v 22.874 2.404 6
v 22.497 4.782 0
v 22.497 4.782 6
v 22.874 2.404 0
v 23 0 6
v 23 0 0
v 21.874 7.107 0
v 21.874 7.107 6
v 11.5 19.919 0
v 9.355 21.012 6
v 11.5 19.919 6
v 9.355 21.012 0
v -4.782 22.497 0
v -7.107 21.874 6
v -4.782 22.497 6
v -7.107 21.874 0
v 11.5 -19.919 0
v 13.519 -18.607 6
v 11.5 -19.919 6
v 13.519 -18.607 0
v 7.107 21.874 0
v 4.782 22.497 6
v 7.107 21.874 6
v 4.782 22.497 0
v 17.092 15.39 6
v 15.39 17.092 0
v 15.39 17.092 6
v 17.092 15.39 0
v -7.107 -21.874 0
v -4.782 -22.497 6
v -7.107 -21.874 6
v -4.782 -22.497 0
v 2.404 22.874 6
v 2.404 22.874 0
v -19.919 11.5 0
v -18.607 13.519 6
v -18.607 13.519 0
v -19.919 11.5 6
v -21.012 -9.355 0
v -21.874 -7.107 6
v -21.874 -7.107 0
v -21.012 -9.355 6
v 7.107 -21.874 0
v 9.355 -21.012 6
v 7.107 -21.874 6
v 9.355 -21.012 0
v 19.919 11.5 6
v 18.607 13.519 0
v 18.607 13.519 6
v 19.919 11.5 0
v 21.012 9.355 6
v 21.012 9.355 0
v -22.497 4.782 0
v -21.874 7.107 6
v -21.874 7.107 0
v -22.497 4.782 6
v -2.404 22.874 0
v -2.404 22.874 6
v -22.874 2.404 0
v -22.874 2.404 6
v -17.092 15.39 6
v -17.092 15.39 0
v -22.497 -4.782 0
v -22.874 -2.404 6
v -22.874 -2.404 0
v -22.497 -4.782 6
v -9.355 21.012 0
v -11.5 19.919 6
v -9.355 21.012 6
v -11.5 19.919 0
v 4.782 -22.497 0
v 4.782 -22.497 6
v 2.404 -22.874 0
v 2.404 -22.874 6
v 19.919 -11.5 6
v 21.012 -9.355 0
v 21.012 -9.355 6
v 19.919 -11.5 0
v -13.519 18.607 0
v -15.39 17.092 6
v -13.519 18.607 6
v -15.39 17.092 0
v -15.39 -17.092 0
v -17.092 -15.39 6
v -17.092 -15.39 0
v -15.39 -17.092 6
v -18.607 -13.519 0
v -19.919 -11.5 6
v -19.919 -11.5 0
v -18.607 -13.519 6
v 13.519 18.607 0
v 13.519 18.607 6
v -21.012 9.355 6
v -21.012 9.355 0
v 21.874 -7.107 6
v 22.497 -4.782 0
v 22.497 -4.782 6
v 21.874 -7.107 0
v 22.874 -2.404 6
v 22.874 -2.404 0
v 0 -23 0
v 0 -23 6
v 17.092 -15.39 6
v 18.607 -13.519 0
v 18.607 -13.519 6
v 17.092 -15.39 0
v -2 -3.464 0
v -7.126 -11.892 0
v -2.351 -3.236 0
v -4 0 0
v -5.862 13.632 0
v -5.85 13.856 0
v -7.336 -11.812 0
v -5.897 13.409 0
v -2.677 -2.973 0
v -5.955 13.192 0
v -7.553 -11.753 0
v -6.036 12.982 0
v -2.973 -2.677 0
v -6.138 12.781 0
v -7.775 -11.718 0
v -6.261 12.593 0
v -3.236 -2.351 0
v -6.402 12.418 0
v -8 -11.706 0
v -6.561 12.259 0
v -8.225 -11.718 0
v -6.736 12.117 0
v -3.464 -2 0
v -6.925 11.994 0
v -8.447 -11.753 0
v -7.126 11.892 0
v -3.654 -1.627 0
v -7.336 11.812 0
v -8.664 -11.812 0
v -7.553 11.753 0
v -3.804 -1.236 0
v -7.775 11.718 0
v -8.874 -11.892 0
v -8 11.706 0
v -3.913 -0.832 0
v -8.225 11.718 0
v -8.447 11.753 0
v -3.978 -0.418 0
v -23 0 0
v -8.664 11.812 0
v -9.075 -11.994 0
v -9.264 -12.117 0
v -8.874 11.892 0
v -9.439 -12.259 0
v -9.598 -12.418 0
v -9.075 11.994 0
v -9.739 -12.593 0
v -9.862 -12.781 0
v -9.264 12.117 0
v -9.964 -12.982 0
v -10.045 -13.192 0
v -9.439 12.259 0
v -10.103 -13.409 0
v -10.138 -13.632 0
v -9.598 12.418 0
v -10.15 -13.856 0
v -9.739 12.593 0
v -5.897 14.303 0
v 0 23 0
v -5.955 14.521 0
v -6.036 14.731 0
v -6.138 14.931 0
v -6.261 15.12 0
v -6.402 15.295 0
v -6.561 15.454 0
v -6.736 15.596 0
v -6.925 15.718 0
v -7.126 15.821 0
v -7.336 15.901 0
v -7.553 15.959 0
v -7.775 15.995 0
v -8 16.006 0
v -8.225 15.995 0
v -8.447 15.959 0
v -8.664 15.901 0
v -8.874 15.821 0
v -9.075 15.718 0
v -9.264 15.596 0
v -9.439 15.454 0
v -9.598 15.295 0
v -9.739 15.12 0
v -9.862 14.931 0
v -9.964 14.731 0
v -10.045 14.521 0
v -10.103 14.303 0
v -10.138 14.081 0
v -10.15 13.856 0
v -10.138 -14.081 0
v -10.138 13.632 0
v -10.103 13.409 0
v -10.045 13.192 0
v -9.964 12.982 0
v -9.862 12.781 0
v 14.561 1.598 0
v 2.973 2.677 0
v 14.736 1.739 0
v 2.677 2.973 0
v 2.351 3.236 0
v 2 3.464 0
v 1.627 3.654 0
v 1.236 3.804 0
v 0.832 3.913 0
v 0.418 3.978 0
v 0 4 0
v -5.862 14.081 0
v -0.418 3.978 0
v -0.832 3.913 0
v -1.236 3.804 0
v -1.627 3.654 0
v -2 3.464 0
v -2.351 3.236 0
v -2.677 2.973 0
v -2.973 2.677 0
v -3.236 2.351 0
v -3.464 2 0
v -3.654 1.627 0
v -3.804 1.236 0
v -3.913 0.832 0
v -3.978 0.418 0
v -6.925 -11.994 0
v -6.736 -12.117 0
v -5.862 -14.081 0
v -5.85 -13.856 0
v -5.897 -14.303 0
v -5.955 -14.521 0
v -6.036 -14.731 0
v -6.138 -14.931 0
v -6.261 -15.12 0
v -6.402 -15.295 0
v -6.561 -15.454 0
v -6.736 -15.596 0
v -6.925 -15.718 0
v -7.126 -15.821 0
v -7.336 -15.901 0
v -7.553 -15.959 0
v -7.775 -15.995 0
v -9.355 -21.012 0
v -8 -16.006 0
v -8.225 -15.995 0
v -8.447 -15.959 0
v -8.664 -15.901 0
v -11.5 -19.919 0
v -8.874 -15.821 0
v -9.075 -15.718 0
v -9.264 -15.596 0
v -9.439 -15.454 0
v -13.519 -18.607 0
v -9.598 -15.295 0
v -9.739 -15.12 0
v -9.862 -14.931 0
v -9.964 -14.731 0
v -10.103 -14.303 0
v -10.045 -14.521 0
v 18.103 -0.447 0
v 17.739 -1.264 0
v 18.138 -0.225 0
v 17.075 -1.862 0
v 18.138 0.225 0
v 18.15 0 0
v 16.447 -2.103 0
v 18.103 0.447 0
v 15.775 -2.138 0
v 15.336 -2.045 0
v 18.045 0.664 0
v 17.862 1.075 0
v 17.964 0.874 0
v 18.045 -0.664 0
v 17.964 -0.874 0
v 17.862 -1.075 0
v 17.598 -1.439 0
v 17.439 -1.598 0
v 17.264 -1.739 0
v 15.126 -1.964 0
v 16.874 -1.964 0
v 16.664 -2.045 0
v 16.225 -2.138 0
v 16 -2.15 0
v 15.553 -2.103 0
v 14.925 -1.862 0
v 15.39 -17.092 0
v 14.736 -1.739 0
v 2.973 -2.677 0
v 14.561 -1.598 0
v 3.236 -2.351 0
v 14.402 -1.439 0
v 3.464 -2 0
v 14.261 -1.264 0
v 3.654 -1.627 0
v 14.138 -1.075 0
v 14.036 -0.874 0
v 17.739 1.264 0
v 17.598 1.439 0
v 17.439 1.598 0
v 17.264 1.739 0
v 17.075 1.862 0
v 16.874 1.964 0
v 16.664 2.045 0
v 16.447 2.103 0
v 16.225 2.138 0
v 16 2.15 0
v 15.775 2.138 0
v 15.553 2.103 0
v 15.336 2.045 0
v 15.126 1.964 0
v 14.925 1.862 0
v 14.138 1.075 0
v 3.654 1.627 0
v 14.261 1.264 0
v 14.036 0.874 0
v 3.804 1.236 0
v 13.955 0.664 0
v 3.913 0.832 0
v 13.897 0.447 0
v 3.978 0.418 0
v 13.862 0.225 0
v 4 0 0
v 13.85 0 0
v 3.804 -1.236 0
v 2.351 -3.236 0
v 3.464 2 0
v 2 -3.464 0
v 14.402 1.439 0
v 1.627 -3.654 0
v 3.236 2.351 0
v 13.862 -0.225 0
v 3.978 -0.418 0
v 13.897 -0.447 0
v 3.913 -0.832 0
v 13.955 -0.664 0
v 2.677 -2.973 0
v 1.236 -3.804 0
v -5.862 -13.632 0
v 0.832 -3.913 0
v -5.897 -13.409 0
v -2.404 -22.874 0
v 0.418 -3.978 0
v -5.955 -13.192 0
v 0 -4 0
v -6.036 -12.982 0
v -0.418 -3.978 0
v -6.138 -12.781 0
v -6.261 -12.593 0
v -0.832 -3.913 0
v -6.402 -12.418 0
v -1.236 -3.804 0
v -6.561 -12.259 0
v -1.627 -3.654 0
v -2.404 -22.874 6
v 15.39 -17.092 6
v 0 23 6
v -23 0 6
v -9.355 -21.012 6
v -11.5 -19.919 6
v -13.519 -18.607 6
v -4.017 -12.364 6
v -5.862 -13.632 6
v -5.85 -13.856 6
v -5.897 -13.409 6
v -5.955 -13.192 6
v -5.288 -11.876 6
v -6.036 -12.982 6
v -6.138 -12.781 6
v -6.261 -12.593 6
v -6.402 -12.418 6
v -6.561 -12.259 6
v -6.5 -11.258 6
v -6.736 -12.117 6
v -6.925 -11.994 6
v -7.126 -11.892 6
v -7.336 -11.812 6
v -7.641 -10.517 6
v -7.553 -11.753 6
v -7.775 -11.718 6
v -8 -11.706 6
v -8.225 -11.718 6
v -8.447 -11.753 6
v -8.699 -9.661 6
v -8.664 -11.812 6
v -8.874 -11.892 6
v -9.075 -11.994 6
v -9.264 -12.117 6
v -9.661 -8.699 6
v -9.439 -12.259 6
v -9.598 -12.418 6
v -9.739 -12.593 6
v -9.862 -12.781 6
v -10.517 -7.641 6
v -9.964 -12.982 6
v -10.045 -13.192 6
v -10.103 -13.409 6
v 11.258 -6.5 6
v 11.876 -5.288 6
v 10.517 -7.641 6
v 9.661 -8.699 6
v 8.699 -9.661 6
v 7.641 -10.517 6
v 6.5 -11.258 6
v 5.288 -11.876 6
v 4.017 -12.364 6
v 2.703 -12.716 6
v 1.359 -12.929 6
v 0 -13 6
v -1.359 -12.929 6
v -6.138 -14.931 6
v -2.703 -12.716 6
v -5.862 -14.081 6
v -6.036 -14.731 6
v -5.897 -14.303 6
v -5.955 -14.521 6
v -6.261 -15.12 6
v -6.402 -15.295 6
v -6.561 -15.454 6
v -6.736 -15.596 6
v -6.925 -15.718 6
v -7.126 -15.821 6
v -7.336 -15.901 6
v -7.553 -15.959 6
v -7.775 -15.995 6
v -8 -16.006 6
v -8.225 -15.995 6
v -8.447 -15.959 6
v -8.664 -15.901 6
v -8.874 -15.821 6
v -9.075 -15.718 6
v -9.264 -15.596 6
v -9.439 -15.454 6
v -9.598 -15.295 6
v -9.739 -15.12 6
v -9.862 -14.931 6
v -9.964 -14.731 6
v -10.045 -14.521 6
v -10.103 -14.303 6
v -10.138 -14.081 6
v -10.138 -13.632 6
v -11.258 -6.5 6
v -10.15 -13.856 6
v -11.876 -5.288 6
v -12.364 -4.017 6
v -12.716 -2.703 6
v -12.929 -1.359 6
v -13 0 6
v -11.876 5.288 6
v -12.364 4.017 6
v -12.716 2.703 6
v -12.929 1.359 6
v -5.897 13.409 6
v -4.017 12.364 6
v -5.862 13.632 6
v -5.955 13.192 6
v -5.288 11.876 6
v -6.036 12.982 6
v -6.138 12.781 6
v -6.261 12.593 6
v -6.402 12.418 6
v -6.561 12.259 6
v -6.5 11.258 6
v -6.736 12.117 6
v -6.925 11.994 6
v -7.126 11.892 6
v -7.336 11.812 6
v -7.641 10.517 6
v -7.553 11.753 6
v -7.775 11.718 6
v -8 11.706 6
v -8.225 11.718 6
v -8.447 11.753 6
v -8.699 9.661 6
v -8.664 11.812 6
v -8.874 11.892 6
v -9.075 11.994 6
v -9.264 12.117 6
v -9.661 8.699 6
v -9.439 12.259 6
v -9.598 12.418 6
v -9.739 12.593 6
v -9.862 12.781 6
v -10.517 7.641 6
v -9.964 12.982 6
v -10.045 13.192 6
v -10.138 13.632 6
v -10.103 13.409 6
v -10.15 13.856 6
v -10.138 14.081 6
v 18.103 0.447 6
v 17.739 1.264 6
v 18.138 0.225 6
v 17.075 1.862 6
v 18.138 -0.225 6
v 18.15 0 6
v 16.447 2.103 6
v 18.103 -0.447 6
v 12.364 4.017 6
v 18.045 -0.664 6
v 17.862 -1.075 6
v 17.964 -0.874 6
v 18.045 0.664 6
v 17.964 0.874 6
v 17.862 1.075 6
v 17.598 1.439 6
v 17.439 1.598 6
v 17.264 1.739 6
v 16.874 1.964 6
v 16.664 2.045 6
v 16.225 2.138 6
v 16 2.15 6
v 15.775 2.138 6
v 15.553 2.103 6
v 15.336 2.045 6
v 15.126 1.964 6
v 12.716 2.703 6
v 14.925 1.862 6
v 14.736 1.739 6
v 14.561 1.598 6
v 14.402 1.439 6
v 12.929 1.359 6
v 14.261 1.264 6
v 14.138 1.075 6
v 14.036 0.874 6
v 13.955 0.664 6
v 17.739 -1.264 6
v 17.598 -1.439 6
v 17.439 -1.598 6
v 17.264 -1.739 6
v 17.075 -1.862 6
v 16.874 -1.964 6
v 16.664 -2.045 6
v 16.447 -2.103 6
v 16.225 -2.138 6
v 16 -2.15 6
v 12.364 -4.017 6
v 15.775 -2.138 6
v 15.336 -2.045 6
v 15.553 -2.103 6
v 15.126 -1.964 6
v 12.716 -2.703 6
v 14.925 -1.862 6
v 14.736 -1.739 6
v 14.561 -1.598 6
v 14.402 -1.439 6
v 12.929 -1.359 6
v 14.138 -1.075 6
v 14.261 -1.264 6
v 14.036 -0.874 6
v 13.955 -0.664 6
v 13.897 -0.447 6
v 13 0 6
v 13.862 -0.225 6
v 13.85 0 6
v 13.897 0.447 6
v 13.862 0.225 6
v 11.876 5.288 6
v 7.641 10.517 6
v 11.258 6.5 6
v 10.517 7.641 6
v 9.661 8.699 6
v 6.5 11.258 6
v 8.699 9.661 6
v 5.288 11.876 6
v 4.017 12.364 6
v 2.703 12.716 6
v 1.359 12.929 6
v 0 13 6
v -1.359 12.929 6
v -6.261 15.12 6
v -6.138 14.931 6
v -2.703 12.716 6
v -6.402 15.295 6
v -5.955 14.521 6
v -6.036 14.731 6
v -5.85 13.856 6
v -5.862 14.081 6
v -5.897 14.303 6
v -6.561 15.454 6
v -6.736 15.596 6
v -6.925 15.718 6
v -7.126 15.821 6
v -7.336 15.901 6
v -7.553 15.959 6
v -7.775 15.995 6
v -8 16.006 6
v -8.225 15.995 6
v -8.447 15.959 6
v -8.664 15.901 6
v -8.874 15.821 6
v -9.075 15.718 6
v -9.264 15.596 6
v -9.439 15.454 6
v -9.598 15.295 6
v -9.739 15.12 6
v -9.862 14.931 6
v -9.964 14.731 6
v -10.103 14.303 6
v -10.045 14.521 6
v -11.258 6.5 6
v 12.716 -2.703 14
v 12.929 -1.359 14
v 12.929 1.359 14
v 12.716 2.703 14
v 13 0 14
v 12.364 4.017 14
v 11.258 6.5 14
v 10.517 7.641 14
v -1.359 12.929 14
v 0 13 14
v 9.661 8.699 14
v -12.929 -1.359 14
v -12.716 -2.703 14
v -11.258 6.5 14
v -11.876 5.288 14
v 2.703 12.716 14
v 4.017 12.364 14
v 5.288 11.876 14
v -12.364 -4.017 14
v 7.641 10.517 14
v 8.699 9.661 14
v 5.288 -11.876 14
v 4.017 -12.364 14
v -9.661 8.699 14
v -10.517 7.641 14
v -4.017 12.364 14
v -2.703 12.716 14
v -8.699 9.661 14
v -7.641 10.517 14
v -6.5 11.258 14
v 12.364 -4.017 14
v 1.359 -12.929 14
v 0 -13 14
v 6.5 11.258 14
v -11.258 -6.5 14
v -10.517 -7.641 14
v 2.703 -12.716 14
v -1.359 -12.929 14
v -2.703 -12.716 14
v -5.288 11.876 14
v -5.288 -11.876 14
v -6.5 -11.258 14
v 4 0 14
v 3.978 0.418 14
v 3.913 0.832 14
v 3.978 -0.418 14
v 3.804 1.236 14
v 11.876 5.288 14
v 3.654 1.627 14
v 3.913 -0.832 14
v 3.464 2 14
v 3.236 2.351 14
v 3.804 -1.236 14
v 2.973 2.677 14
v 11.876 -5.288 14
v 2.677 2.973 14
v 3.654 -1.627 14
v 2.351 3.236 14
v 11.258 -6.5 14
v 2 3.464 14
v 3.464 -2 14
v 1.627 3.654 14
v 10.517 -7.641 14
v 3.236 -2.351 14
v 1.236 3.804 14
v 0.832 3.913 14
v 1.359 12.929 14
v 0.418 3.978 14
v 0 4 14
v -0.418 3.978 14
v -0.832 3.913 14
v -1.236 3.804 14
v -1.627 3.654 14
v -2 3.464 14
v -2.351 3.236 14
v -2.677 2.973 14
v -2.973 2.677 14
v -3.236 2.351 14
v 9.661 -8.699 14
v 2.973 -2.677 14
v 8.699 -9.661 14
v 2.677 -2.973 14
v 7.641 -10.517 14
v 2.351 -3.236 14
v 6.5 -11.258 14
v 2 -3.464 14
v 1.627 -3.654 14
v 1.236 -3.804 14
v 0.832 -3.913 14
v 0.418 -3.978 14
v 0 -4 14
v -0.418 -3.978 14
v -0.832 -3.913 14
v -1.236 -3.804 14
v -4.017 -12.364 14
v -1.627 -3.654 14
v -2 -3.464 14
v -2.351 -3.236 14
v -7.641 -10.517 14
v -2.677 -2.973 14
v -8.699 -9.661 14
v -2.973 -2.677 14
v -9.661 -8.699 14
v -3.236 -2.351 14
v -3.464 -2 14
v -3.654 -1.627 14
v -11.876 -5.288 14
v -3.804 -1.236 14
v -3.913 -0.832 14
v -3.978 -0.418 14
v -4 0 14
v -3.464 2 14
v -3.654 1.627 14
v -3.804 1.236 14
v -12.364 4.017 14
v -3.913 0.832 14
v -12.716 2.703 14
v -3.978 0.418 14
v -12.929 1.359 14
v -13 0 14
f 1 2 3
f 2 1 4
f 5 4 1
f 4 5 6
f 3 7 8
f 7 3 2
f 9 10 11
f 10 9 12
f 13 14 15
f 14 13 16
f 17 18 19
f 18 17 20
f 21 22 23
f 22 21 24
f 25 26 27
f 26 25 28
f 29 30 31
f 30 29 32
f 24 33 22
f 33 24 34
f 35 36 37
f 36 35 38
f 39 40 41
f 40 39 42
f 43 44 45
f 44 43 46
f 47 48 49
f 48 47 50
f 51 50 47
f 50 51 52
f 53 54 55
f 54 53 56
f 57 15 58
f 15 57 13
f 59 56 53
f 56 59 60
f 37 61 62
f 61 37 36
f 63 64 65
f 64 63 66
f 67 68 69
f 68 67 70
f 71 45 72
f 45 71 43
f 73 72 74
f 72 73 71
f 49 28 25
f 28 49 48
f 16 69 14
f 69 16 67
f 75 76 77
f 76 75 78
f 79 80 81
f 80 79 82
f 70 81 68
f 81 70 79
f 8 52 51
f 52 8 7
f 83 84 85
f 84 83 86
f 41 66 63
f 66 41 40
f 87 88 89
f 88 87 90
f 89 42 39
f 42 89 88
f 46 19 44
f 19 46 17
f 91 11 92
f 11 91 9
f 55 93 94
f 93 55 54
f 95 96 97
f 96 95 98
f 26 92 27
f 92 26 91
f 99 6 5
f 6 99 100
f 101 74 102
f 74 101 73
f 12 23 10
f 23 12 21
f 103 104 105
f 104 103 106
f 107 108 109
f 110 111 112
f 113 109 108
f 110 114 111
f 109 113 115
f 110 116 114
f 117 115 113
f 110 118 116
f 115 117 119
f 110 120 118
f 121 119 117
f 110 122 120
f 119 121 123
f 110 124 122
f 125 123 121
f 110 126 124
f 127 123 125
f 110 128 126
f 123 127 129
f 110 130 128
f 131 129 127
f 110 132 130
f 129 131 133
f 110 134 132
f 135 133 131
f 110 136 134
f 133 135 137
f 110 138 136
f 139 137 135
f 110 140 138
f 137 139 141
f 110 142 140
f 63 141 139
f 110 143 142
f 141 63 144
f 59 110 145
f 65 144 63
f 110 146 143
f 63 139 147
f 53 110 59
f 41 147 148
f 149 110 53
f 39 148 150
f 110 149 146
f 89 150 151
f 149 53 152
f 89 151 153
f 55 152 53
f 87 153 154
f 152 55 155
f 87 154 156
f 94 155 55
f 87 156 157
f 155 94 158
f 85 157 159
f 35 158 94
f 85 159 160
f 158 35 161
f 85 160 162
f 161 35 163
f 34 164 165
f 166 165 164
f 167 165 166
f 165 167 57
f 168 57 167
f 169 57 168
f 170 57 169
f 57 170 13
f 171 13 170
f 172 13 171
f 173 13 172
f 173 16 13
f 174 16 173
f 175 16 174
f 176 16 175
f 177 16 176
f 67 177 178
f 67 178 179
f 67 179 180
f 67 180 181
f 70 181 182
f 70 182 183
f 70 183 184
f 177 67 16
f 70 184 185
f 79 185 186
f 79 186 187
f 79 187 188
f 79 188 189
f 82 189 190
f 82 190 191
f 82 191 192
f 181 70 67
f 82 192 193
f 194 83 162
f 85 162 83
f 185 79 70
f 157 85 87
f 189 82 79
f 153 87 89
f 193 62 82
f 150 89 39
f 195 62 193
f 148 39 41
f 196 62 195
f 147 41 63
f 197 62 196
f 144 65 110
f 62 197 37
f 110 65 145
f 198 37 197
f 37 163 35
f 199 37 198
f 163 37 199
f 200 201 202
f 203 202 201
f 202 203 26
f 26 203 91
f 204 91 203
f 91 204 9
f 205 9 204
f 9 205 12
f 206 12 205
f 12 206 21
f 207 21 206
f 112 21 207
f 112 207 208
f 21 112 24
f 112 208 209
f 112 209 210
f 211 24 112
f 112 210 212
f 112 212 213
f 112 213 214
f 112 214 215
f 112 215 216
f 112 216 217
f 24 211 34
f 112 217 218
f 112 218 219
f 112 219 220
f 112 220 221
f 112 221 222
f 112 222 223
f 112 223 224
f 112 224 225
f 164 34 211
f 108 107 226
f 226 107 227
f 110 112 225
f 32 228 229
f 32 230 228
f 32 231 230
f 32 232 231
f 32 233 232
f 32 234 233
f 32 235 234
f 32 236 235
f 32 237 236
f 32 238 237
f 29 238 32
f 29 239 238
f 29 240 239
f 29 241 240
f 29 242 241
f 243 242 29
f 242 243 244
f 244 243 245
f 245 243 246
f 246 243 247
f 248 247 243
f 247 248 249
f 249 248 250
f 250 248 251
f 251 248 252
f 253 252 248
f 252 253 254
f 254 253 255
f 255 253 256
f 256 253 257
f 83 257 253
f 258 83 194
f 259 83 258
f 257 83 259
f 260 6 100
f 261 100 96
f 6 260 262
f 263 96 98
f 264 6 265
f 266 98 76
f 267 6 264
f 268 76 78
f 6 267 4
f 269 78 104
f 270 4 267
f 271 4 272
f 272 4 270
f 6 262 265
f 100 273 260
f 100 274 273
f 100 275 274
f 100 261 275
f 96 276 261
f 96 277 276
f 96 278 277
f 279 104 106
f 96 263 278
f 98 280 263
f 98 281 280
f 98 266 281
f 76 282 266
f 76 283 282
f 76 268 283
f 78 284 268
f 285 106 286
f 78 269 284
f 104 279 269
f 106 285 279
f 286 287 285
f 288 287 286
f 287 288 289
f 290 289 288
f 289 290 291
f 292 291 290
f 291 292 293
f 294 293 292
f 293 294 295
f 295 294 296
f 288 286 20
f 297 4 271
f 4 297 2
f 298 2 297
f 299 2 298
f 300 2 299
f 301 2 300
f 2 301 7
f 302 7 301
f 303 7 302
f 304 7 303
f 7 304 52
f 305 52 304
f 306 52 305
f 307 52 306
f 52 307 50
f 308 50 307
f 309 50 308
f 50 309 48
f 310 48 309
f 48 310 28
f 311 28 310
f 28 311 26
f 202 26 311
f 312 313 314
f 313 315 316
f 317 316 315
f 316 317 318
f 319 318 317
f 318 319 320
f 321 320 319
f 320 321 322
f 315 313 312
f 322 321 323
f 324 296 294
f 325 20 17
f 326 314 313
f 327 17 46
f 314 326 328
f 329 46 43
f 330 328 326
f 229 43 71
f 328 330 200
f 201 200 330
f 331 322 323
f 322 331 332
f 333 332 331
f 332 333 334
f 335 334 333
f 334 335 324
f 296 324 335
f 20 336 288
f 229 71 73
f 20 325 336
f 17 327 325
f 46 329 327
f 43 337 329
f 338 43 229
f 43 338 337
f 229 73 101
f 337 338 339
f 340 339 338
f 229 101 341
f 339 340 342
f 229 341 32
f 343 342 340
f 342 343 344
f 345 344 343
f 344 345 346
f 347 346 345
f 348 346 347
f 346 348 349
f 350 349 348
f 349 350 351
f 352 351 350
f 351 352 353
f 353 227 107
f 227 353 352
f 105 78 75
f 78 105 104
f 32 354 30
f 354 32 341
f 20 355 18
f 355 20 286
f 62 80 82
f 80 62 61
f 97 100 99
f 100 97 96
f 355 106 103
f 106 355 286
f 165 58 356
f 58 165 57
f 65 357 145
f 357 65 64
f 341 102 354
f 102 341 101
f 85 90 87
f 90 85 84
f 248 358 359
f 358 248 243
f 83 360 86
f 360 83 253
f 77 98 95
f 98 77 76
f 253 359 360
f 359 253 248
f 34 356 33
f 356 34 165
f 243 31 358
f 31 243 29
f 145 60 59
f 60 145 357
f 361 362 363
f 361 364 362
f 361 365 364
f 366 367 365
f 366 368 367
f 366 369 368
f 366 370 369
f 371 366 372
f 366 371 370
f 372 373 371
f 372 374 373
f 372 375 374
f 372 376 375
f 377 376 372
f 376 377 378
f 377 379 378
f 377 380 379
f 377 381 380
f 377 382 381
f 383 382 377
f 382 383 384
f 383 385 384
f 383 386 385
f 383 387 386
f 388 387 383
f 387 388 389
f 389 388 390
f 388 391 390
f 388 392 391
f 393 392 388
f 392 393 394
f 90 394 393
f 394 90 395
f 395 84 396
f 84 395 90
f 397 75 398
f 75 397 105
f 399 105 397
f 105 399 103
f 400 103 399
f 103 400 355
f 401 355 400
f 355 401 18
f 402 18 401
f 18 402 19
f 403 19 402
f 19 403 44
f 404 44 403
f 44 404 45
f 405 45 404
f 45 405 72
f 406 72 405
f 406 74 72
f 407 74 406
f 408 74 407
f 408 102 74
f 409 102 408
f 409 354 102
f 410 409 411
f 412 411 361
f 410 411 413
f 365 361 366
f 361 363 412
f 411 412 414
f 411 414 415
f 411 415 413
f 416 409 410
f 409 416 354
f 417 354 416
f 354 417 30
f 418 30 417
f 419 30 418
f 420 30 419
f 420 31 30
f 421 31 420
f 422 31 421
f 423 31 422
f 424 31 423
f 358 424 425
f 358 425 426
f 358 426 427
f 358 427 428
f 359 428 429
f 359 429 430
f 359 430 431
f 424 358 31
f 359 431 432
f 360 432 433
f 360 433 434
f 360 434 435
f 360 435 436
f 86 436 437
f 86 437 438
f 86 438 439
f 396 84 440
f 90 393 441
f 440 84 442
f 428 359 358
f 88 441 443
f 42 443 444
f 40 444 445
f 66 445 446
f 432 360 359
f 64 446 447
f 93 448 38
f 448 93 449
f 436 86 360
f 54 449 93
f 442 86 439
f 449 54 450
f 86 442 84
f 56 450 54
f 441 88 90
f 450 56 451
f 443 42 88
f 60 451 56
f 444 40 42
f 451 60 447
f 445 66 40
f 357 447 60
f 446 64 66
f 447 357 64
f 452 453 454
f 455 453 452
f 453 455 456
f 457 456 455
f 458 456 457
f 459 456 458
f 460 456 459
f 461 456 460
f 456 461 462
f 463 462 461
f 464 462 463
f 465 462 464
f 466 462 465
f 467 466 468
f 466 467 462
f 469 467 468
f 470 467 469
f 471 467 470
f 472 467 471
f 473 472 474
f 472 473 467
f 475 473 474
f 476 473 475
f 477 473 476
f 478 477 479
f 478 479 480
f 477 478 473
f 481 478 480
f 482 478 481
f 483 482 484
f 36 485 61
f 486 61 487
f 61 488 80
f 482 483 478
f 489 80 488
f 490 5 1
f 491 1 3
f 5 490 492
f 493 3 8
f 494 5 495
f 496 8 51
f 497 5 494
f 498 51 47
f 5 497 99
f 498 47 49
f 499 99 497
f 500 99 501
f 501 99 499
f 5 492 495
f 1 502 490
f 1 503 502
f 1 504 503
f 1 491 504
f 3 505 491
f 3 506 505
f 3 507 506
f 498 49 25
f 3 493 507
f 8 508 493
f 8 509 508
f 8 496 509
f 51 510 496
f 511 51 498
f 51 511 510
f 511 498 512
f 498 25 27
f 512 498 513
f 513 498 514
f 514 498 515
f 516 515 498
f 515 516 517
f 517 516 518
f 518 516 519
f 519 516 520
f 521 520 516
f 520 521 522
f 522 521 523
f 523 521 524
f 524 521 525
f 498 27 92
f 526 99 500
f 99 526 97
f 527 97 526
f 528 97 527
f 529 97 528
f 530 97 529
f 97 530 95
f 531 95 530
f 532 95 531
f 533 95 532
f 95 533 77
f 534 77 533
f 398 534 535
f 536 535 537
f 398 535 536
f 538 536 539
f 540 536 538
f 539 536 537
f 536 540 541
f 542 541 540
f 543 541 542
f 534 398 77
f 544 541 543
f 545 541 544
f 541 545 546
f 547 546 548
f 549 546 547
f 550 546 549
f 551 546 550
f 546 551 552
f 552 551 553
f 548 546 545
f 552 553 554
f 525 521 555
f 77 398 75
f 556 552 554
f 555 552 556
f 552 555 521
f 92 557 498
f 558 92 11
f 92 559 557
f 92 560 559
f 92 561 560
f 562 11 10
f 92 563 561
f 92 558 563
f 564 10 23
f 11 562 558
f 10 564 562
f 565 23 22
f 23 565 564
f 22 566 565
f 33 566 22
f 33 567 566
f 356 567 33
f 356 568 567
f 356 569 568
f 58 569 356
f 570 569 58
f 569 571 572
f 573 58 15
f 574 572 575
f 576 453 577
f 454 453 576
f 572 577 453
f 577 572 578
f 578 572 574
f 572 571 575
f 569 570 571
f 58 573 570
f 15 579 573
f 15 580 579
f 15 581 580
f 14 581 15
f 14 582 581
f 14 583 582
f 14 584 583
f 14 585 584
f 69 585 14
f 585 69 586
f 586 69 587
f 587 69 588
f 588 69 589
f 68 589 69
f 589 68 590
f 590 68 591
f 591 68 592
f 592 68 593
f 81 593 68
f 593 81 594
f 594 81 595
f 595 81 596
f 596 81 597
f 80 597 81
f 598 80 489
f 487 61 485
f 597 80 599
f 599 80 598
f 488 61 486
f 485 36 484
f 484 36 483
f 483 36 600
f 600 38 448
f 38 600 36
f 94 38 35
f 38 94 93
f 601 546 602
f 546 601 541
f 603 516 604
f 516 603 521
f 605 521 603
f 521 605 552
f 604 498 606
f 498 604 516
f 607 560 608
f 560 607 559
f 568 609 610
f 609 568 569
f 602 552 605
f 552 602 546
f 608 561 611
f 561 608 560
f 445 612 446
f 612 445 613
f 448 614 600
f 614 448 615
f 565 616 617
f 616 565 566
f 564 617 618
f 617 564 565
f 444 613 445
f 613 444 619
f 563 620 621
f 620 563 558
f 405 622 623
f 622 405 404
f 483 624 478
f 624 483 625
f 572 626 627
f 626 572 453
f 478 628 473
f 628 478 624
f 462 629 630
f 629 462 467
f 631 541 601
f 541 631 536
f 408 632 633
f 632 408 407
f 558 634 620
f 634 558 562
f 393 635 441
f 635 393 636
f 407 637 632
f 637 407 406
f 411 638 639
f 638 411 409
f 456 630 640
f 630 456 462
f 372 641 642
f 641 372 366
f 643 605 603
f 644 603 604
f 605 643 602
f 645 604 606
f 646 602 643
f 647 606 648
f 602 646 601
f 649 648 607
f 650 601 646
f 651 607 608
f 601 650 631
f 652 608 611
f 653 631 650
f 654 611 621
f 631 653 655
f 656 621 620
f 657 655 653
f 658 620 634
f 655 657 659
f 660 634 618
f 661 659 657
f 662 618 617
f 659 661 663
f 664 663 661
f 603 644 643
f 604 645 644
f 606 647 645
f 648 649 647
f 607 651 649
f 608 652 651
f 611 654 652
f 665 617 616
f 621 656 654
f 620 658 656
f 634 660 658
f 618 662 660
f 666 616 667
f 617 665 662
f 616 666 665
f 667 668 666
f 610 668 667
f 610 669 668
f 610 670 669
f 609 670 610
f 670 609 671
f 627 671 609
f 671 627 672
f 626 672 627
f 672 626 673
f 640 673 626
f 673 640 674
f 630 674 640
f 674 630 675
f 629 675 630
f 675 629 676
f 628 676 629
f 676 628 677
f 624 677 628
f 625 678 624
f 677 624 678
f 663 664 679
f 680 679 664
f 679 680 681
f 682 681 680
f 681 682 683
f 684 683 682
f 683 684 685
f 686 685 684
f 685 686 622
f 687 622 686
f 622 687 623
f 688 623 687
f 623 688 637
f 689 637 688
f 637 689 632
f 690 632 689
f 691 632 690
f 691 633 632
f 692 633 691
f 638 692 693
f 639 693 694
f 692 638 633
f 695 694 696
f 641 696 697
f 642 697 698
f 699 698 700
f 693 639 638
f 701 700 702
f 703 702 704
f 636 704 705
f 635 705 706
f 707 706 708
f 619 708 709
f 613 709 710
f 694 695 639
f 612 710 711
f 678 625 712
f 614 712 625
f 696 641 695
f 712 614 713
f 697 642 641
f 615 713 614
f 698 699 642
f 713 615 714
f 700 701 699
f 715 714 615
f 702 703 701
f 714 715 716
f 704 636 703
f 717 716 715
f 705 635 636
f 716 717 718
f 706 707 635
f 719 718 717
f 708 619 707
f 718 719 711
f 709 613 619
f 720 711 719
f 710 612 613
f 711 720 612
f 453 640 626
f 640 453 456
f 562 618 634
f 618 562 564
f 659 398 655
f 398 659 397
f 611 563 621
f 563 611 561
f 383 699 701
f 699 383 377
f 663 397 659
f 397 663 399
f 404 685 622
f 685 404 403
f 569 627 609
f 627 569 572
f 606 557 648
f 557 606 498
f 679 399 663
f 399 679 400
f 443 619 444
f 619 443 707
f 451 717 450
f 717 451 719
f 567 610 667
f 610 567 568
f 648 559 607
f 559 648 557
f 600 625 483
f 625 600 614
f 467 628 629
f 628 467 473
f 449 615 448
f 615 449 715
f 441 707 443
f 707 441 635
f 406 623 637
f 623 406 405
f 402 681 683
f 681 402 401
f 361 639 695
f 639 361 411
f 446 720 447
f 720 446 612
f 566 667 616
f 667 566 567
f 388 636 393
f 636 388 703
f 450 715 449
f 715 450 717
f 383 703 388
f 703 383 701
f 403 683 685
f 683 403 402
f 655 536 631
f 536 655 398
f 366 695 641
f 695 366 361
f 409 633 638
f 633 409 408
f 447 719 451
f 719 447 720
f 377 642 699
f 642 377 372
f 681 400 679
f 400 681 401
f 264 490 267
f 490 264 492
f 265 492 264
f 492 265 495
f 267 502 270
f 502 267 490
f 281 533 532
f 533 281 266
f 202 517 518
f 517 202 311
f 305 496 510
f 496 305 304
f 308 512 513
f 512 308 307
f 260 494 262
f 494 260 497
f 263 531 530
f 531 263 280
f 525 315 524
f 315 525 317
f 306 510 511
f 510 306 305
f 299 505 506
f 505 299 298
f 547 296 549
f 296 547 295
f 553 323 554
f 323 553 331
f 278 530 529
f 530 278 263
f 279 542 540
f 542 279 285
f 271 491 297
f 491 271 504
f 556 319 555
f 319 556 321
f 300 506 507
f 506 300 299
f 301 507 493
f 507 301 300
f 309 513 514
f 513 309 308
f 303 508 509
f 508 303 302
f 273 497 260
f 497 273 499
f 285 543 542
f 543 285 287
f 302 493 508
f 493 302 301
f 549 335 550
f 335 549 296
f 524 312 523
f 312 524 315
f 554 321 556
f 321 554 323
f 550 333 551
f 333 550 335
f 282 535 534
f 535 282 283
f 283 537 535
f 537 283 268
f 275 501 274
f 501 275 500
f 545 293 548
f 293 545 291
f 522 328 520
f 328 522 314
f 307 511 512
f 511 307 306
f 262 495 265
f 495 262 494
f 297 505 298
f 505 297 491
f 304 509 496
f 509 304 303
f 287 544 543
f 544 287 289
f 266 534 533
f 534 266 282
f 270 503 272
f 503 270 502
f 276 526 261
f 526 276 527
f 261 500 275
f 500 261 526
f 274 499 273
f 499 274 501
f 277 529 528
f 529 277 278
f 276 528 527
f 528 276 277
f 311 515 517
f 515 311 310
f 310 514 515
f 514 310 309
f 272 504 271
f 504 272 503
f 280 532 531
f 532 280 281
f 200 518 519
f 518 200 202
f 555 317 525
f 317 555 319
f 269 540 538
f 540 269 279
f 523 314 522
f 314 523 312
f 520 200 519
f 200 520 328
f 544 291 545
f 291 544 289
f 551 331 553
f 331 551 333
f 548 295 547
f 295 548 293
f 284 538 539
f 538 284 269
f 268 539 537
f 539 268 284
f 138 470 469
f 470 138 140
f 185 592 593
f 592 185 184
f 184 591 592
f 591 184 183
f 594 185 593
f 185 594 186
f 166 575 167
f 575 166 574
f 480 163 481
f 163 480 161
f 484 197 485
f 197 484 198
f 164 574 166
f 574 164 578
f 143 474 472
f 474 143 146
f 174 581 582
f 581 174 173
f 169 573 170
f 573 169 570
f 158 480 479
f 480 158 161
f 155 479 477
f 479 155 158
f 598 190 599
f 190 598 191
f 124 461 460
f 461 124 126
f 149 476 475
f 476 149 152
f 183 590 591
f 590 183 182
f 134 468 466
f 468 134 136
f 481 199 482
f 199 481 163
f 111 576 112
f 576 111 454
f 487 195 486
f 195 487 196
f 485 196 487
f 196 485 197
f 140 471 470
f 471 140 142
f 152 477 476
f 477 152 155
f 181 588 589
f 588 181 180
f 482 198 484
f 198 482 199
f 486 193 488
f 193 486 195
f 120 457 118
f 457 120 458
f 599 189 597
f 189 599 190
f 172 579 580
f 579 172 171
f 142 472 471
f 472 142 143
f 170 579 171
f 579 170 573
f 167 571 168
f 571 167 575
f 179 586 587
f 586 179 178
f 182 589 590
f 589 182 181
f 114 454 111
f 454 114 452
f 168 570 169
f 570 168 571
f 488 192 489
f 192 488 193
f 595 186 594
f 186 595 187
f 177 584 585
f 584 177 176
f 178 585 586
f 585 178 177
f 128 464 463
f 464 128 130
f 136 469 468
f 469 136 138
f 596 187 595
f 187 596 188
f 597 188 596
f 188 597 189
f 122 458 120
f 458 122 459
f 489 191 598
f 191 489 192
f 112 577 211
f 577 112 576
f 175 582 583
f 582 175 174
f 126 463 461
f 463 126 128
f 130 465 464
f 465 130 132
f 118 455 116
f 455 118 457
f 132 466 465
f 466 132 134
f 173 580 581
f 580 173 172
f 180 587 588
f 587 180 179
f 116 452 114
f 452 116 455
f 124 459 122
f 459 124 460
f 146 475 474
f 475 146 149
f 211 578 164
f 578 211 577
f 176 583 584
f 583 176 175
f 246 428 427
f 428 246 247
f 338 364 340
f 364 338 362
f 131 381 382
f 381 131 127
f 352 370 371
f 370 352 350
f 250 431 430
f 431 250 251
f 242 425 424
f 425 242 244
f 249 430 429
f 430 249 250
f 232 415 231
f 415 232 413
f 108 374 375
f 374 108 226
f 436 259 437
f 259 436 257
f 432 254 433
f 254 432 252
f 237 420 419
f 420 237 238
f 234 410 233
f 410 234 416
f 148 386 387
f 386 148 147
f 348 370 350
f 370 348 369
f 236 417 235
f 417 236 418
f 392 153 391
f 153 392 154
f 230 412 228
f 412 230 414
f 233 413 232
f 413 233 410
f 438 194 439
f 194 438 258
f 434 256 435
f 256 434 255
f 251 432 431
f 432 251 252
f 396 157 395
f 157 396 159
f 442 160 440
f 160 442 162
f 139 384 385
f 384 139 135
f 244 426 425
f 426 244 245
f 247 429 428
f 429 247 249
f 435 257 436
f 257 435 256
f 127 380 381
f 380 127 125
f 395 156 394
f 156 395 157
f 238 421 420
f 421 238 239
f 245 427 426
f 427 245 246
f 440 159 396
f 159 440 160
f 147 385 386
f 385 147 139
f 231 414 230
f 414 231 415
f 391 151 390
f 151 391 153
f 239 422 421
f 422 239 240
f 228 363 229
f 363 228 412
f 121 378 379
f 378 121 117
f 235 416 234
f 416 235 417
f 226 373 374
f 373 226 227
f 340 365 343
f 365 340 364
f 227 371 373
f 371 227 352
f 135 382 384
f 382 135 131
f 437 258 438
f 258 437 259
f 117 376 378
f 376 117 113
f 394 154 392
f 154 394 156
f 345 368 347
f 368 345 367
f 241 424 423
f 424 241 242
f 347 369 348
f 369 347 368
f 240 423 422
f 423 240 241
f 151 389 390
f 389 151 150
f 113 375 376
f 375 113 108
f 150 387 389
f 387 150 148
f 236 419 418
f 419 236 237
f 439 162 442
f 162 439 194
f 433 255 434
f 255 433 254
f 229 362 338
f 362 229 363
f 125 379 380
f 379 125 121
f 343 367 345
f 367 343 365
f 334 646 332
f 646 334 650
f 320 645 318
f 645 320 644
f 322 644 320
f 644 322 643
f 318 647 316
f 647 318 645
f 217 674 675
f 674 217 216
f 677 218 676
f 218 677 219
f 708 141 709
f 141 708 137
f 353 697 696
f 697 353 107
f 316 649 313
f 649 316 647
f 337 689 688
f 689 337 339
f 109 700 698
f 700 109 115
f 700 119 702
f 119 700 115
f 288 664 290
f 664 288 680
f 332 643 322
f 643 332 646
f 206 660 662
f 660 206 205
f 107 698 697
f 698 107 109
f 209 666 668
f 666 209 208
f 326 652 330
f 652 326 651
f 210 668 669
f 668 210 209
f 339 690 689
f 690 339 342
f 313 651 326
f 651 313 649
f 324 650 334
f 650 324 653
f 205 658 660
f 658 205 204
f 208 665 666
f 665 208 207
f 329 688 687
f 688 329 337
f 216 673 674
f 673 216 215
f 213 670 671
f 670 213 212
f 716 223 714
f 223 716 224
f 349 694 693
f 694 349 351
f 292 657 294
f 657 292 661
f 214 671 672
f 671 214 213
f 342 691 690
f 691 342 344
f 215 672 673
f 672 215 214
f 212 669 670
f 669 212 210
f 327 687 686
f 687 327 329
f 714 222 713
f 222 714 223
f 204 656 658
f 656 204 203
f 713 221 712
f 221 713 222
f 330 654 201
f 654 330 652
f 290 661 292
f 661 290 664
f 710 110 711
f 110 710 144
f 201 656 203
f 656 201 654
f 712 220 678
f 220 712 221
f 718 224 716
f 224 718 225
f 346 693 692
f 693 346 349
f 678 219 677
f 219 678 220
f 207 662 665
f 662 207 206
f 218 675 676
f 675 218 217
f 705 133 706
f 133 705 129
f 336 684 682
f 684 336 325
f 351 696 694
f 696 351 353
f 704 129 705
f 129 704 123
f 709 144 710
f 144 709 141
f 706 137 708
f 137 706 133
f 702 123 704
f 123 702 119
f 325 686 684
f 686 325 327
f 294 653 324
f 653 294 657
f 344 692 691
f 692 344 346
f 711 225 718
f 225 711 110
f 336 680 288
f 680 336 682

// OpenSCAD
// 3-bolt mounting flange, 46 mm OD.
$fn = 60;
eps = 0.02;
flange_d = 46;
flange_t = 6;
hub_d = 26;
hub_h = 14;
center_d = 8;
bolt_circle_d = 32;
bolt_d = 4.3;
difference() {
    union() { cylinder(d = flange_d, h = flange_t); cylinder(d = hub_d, h = hub_h); }
    translate([0, 0, -eps]) cylinder(d = center_d, h = hub_h + 2 * eps);
    for (i = [0 : 2]) rotate([0, 0, i * 360 / 3])
        translate([bolt_circle_d / 2, 0, -eps]) cylinder(d = bolt_d, h = flange_t + 2 * eps);
}
